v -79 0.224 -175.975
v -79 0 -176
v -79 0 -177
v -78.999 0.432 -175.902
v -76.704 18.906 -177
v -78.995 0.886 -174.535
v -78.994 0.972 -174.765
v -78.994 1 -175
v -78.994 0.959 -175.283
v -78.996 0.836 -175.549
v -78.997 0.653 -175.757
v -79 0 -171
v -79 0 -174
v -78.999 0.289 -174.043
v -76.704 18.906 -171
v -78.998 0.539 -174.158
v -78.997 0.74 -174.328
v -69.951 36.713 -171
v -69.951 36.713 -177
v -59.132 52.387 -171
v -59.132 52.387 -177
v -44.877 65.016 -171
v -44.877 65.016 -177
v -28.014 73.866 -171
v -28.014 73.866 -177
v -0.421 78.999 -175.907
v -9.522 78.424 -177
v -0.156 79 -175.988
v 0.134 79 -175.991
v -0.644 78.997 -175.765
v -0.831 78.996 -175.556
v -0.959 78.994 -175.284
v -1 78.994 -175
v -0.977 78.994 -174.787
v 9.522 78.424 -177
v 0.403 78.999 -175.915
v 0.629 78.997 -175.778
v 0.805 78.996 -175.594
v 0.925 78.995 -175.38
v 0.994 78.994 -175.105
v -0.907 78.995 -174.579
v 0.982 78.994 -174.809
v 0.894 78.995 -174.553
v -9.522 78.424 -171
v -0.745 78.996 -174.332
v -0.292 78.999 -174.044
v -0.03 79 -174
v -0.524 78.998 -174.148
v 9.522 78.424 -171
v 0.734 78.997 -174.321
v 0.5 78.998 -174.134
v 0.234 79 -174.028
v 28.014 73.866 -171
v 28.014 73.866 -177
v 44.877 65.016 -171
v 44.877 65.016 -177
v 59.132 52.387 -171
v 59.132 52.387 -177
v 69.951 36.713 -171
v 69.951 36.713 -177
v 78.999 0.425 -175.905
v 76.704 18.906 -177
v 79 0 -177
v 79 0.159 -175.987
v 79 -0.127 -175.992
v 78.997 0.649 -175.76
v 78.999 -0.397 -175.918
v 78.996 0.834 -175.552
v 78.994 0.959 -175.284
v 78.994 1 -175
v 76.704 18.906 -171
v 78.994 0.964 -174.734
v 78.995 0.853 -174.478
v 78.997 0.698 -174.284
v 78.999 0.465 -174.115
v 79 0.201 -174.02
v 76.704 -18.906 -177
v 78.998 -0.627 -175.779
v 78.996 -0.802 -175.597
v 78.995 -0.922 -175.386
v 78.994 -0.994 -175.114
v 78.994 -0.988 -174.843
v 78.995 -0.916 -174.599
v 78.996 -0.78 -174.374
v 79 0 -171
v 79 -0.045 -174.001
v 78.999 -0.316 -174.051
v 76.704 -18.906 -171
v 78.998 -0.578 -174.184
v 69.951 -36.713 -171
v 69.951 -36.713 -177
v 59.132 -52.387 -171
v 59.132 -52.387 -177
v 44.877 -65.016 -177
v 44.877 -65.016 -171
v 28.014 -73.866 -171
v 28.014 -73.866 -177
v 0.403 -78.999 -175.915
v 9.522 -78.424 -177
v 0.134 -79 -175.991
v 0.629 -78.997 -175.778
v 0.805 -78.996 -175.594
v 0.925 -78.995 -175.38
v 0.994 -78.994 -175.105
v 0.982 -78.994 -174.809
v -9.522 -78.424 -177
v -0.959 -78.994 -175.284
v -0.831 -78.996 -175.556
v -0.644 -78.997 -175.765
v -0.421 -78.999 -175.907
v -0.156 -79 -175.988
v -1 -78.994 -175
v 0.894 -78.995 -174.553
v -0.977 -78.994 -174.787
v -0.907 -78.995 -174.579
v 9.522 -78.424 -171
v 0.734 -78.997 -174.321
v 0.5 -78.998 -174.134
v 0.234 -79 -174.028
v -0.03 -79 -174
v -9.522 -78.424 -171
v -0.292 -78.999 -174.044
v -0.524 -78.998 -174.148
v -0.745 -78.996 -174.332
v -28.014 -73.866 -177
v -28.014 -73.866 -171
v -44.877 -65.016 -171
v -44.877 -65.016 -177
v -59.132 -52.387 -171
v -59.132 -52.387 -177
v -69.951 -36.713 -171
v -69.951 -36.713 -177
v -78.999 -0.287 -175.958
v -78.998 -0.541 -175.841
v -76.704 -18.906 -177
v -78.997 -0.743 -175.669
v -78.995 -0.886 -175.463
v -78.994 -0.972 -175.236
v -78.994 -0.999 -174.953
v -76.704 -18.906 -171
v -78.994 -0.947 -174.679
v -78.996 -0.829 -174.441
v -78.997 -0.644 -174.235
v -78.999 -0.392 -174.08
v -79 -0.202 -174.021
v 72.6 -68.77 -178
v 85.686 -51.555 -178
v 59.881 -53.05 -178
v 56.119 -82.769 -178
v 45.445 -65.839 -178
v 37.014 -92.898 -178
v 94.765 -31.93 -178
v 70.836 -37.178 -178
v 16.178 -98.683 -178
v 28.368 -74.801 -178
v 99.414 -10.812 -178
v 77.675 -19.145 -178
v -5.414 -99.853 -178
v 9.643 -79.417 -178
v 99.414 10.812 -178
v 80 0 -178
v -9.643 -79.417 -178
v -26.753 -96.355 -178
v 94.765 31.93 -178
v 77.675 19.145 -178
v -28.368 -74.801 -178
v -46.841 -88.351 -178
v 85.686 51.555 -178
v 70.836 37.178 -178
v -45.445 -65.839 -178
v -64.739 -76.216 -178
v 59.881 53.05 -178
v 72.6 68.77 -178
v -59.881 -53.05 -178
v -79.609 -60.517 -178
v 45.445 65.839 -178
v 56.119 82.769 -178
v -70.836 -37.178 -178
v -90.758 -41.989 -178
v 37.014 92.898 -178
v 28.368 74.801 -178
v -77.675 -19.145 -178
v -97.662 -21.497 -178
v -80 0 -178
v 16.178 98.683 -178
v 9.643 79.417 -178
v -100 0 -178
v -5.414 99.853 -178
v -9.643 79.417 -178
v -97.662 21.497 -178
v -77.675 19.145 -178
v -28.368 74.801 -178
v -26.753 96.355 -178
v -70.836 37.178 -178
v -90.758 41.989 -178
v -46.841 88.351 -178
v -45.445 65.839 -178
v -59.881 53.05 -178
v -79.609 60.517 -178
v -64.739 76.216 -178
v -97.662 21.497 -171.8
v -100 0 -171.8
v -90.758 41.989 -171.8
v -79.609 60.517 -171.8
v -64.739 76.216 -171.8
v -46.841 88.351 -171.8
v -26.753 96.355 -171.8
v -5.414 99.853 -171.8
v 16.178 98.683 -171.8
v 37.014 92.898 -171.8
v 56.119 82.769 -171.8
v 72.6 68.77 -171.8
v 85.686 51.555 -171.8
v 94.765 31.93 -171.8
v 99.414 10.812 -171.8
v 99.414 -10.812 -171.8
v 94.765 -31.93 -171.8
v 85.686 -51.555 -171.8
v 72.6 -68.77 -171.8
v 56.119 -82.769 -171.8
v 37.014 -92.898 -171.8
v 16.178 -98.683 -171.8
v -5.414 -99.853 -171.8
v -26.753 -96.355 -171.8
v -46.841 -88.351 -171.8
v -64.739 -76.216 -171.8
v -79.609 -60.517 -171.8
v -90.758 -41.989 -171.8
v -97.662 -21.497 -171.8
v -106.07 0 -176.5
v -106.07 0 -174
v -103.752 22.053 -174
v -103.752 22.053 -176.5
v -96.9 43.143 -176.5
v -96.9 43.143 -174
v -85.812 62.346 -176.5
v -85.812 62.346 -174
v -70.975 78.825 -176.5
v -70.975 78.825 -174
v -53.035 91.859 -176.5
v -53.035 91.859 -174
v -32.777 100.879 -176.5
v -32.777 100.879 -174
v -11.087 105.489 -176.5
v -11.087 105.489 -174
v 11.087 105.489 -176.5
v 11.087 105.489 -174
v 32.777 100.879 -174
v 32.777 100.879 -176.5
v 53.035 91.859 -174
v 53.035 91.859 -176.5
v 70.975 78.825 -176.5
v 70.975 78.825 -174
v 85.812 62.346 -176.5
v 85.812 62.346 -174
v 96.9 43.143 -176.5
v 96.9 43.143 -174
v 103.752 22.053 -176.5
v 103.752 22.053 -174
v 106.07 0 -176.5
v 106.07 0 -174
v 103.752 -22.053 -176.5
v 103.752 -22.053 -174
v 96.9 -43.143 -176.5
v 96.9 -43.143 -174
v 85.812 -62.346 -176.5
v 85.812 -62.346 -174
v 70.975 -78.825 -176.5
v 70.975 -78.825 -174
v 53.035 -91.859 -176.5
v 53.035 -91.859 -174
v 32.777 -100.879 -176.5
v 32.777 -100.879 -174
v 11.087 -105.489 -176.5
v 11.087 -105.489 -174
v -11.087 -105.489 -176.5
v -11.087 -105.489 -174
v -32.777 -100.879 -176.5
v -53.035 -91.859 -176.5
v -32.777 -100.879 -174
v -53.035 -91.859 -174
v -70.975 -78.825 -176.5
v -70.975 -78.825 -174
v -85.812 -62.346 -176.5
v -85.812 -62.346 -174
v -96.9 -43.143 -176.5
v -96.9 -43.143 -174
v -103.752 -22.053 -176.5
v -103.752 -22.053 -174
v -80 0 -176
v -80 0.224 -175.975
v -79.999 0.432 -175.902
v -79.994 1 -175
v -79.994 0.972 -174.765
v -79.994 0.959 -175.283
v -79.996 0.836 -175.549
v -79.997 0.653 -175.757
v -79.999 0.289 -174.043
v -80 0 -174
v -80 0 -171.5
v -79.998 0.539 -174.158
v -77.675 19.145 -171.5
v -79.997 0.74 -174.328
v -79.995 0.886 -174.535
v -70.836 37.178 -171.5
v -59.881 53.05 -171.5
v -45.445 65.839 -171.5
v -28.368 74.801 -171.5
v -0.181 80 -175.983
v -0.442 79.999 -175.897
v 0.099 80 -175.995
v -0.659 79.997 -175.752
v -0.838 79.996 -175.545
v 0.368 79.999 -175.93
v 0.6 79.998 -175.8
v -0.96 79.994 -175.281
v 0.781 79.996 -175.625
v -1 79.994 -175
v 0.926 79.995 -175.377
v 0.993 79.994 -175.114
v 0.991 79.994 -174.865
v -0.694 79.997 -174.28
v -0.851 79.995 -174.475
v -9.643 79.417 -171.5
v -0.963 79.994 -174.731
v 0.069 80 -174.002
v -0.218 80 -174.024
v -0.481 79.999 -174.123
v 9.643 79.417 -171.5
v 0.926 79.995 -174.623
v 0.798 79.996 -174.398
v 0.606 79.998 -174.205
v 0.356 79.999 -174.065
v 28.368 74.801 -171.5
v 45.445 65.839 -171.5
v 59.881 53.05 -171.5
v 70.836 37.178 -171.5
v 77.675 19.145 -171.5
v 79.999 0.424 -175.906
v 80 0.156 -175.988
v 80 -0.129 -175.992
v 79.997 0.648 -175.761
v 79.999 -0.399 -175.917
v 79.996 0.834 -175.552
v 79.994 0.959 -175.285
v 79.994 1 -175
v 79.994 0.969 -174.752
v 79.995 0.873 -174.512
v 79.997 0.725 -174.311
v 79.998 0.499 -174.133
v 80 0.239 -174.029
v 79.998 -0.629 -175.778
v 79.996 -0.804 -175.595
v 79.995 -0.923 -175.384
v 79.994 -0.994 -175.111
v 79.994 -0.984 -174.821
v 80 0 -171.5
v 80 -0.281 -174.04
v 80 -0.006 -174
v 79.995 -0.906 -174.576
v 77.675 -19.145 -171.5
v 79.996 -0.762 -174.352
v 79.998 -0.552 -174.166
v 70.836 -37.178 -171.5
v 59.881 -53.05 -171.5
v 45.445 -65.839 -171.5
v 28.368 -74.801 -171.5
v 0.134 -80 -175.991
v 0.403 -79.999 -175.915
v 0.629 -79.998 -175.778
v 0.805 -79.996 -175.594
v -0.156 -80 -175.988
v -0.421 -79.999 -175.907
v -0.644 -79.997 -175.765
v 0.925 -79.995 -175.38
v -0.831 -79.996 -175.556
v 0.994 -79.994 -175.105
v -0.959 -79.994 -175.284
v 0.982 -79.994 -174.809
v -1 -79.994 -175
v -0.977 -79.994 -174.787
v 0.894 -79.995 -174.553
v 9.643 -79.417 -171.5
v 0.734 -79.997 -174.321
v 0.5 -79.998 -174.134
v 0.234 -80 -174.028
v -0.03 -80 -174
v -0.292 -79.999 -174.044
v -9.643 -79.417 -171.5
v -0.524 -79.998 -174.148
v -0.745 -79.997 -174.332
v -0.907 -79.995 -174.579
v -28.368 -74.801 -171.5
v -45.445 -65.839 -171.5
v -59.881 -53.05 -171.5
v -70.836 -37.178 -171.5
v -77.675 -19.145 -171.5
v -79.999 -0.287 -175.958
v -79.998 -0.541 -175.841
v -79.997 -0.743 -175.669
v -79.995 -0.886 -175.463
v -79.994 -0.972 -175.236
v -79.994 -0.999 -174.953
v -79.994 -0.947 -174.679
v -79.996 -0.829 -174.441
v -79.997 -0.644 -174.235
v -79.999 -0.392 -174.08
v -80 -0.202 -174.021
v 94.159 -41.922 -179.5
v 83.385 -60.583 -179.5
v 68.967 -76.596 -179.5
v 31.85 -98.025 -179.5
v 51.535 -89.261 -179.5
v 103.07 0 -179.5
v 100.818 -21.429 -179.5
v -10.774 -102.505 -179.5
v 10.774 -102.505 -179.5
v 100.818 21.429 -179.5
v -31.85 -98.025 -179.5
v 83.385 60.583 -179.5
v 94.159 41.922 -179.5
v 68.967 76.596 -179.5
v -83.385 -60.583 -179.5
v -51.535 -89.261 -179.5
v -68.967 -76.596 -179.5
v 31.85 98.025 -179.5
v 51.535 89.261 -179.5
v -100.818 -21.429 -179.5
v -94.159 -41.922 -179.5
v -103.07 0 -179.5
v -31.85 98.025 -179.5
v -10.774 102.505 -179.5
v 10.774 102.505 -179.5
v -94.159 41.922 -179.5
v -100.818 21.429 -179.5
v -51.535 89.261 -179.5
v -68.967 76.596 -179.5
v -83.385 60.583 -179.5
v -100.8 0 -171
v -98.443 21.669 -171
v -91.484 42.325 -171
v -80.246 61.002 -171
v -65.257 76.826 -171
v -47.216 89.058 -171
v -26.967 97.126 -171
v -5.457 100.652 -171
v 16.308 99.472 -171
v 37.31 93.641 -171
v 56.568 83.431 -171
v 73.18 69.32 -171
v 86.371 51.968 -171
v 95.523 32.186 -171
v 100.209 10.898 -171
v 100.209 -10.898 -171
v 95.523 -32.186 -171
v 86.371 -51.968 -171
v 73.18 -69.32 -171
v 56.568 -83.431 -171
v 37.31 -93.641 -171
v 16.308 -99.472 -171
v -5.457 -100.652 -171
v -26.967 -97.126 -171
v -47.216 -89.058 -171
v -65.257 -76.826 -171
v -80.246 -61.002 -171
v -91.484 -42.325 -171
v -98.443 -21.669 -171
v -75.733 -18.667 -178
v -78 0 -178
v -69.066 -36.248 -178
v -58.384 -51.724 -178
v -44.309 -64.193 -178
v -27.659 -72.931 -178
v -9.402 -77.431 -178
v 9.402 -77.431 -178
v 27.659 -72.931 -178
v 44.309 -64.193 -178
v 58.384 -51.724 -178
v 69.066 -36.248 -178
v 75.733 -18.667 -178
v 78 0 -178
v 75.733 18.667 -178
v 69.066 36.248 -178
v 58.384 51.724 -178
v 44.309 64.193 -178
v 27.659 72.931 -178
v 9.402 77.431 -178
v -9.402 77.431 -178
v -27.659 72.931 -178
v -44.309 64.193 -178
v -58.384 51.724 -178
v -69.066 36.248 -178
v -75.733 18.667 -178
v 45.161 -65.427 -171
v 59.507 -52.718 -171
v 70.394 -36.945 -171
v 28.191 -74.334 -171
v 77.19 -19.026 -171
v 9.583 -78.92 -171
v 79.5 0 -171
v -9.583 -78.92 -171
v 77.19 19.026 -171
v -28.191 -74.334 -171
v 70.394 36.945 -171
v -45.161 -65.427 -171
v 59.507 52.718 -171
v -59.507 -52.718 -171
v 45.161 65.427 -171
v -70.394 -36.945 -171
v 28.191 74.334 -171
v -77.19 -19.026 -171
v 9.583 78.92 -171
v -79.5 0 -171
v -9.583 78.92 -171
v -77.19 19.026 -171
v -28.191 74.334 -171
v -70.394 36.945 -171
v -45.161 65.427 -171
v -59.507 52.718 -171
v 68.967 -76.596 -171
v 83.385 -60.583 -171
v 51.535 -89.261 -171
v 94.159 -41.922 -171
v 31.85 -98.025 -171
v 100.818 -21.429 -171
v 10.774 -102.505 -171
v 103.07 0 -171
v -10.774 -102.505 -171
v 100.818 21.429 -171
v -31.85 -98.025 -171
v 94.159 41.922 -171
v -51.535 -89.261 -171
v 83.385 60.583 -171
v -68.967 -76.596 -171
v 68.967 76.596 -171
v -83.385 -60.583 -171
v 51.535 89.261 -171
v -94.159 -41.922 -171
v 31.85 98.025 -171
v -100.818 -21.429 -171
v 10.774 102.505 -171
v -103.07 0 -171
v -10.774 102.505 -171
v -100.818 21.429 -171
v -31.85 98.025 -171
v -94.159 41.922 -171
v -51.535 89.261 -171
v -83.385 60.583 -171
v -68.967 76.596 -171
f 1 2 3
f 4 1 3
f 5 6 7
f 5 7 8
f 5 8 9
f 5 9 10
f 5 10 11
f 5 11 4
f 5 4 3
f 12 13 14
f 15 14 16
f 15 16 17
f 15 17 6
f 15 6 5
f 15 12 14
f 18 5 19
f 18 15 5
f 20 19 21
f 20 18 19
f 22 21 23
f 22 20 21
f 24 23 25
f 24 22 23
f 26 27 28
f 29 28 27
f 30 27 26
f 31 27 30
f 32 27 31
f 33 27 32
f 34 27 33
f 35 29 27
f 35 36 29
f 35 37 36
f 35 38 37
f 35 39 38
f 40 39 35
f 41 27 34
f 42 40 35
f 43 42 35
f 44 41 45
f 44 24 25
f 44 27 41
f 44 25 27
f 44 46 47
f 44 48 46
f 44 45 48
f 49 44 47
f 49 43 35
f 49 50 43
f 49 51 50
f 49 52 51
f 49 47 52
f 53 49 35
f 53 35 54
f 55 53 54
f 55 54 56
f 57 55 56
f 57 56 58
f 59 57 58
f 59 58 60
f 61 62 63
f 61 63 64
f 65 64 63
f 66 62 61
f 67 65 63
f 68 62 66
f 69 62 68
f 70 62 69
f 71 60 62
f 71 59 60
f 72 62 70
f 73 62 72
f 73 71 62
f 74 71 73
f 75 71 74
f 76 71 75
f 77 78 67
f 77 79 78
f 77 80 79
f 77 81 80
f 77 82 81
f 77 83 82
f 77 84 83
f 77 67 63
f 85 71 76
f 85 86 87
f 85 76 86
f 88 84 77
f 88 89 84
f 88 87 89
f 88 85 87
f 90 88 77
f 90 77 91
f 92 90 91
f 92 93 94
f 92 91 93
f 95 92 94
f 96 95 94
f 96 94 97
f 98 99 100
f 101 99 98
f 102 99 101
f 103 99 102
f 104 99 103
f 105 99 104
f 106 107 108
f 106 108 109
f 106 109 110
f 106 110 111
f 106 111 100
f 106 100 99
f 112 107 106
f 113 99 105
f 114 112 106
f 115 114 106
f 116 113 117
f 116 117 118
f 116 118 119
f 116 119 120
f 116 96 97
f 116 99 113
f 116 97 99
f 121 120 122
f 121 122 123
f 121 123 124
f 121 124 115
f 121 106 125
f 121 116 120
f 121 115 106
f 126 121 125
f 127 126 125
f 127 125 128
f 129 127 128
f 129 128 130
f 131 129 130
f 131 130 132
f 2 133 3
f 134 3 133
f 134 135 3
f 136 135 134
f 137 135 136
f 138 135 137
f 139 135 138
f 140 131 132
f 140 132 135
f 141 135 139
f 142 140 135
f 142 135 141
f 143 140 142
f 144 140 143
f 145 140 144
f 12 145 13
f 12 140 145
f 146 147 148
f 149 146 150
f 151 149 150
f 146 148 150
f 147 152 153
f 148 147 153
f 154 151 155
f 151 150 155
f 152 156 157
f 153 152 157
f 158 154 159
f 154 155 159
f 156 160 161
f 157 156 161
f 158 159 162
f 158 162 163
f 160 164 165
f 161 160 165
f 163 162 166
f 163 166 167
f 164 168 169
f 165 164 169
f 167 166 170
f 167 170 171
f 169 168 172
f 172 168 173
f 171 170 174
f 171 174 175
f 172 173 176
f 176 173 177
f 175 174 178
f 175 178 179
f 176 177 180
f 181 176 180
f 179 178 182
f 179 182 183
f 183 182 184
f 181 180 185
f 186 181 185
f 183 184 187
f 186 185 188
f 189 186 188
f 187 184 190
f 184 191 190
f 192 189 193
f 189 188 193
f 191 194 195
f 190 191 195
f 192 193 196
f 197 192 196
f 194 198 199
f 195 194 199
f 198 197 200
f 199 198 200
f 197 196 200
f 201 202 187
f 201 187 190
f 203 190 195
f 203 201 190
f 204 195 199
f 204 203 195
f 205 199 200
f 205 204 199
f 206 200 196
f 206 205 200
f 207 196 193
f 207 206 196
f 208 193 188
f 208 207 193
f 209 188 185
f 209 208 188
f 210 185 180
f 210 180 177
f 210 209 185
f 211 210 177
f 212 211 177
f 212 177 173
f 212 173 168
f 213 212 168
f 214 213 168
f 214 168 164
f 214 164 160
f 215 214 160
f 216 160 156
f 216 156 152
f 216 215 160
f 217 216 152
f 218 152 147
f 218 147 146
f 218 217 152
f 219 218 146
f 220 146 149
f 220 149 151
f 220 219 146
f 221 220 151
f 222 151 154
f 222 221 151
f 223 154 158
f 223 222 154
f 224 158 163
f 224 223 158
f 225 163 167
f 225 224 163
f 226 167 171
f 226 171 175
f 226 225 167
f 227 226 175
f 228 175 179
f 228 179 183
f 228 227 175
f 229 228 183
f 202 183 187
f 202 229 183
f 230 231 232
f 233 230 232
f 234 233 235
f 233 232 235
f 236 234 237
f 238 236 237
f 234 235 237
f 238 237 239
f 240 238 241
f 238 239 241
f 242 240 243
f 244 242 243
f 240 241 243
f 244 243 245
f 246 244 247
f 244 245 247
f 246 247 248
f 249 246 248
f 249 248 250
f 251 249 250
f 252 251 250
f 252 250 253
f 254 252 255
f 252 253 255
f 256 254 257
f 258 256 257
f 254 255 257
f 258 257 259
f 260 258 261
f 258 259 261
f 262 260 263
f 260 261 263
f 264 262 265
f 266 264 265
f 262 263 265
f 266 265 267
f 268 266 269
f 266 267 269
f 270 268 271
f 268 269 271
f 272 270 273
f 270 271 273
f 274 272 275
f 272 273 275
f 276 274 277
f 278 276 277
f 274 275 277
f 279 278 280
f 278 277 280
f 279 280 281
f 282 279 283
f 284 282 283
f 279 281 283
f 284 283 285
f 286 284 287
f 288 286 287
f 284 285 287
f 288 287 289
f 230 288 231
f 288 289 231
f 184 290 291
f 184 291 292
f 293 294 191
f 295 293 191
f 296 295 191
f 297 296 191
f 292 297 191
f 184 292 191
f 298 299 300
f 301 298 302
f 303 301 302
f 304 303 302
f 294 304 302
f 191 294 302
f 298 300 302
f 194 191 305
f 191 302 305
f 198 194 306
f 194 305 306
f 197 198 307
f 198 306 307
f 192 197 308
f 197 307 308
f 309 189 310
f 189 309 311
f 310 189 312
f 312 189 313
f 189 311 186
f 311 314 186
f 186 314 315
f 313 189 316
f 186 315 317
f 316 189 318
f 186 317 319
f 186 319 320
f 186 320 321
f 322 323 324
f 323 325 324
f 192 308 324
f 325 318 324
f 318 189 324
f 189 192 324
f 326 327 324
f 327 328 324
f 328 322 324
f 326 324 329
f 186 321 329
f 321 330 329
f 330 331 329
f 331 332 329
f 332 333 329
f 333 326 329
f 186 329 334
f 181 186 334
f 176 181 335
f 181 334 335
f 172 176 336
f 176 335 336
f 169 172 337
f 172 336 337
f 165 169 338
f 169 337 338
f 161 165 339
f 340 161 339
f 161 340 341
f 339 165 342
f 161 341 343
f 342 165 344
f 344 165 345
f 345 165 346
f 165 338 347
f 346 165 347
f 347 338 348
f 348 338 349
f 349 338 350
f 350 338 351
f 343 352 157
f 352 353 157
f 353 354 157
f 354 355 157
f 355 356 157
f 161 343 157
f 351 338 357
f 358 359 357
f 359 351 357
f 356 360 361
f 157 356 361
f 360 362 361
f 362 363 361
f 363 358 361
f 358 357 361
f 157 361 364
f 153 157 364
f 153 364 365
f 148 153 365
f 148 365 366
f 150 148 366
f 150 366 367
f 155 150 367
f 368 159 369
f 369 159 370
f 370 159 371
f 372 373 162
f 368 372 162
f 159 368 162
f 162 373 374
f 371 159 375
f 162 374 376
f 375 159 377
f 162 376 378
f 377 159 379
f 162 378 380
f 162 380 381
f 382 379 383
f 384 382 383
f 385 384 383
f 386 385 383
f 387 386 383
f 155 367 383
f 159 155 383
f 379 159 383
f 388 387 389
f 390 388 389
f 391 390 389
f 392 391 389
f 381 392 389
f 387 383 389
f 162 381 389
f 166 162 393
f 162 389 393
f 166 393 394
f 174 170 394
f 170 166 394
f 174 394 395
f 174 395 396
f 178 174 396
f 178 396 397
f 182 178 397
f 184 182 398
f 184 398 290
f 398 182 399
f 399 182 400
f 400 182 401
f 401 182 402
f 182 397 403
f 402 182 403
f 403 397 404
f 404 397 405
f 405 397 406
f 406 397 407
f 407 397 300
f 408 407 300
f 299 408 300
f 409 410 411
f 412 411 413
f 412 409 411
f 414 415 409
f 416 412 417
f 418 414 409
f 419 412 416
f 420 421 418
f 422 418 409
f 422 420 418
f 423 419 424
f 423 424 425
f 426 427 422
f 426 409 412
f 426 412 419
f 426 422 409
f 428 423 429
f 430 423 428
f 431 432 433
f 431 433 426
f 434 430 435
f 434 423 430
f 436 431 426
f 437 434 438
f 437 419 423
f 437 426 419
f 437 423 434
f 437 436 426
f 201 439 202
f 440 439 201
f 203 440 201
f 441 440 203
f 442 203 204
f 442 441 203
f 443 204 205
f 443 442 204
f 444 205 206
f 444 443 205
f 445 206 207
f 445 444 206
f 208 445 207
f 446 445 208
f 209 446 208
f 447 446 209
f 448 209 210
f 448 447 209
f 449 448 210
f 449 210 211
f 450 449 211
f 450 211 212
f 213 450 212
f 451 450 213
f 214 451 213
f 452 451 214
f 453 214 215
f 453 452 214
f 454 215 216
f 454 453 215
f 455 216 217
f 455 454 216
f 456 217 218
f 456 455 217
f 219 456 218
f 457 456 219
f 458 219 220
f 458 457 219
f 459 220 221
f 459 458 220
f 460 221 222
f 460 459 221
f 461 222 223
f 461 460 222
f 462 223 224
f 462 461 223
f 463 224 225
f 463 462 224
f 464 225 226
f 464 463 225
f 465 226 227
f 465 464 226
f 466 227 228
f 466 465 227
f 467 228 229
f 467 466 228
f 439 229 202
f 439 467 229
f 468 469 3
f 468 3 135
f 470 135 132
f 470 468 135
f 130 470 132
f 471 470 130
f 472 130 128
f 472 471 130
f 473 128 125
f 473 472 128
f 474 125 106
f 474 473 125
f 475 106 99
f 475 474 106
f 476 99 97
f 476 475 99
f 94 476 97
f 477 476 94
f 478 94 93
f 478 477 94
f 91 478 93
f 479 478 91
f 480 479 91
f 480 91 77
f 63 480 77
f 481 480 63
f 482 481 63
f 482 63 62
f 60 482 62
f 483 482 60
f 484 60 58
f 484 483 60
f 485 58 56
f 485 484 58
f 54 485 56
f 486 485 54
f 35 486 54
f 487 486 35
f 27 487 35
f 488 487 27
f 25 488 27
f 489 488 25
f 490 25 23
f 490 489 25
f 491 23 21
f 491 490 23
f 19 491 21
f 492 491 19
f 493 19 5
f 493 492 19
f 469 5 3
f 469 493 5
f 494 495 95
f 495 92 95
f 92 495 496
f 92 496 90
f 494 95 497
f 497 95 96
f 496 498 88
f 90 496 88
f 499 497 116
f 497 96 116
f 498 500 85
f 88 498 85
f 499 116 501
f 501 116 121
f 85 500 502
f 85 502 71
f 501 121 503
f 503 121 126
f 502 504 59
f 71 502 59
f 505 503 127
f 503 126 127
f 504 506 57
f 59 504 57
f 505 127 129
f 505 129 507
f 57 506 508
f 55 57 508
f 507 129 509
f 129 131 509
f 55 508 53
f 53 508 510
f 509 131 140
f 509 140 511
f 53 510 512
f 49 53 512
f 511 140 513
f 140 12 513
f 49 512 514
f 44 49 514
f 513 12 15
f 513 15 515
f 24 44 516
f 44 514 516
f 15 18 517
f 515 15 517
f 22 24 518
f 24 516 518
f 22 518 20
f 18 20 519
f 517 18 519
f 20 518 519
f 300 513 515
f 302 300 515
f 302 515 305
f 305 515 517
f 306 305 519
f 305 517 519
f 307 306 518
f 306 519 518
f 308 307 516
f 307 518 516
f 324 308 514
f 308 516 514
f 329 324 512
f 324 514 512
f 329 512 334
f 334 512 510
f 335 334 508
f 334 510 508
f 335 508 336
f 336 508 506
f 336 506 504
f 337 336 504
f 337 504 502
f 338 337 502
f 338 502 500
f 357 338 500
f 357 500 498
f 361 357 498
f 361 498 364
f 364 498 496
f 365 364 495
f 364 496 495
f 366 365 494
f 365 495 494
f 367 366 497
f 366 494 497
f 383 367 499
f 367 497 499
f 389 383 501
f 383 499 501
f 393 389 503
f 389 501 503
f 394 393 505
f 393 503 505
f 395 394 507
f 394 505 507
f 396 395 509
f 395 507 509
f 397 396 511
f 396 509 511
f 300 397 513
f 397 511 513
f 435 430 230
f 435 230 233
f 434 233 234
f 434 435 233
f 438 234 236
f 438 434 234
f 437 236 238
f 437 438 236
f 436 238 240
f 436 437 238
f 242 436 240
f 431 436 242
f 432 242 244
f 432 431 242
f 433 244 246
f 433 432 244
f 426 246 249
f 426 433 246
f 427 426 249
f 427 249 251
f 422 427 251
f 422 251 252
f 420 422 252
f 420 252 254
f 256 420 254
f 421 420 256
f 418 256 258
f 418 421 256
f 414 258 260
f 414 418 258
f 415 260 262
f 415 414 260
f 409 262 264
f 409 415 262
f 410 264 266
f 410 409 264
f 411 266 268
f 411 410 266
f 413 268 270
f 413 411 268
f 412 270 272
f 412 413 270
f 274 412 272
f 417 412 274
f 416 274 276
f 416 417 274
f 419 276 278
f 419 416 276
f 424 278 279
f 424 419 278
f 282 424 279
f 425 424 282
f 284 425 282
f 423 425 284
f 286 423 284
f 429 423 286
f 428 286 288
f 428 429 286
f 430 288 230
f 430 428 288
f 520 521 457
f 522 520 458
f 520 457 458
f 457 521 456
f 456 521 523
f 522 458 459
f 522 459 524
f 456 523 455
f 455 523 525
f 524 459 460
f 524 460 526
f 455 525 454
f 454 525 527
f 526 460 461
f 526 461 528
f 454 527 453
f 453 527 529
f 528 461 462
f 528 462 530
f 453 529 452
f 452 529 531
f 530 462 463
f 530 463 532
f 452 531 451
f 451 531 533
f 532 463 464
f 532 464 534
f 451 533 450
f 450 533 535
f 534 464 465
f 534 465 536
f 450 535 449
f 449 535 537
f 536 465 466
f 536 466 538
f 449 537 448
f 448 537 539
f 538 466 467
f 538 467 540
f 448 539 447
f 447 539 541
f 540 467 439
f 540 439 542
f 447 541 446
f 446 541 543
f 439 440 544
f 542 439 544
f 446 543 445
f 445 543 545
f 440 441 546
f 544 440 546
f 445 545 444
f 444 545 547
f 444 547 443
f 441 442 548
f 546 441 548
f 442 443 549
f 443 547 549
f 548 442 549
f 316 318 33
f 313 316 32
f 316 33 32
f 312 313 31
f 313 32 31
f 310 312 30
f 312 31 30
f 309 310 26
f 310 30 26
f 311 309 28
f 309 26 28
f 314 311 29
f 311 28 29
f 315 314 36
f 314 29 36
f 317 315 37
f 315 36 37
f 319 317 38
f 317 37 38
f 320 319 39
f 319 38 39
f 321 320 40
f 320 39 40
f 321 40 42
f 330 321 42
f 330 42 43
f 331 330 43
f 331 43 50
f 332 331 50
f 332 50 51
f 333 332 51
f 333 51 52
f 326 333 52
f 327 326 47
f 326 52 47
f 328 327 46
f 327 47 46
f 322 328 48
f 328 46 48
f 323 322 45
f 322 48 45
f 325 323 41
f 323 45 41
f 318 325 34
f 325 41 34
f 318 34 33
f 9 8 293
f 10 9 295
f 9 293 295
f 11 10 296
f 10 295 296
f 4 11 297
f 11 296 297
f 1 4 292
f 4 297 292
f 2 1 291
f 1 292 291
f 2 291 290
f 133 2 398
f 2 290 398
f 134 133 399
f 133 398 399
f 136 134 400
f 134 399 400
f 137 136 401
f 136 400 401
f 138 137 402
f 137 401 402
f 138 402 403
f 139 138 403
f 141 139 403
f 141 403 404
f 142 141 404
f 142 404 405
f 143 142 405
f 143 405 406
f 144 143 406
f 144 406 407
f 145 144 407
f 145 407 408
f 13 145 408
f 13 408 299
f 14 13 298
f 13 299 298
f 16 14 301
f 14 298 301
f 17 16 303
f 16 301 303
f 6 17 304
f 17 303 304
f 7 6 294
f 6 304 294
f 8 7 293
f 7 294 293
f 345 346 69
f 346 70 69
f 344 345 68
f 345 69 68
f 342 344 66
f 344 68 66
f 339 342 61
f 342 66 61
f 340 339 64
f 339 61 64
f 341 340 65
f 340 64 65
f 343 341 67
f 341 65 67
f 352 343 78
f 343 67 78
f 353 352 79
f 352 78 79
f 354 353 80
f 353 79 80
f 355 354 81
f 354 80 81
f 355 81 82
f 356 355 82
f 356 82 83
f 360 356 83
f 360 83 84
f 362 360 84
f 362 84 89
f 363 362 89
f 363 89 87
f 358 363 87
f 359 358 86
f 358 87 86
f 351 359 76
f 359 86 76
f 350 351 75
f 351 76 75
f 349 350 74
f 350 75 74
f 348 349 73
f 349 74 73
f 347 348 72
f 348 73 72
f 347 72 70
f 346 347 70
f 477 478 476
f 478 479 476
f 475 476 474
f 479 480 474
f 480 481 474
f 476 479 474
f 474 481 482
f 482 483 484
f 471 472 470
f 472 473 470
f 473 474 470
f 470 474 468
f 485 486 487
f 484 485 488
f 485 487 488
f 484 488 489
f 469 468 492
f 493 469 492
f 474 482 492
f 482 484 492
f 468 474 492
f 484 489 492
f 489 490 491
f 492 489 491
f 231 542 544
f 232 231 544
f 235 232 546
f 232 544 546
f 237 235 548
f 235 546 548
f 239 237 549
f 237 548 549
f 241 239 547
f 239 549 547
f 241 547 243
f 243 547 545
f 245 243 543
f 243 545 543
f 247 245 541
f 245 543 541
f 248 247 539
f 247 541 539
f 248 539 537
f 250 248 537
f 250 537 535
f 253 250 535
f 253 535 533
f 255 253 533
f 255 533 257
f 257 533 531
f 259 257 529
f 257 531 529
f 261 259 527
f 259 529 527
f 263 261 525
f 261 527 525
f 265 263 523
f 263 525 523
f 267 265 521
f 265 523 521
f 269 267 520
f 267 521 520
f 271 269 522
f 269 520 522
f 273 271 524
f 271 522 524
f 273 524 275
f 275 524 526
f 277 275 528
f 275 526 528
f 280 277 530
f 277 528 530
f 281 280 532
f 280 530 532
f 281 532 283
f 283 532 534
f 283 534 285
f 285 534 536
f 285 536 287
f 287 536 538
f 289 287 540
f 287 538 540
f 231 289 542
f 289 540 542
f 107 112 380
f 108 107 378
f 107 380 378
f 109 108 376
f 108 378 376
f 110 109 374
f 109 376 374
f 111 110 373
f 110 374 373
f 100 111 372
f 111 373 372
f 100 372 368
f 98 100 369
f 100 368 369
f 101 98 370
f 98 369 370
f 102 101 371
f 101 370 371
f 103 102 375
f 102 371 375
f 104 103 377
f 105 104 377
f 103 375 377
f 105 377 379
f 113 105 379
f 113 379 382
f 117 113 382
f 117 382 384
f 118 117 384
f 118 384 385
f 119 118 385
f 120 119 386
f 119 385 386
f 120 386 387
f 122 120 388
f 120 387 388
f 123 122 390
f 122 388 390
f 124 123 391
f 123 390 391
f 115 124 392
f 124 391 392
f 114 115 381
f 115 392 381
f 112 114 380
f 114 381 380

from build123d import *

# Parameters (mm, degrees)
SKETCH019_R             = 106.07
PAD010_DEPTH            = 8.5
SKETCH020_R             = 100
POCKET001_DEPTH         = 7
CHAMFER008_SIZE         = 3
CHAMFER015_SIZE         = 3
SKETCH028_R             = 80
SKETCH028_R_2           = 79
PAD012_DEPTH            = 8
SKETCH029_R             = 1
POCKET006_DEPTH         = 87.5
SKETCH030_R             = 1
POCKET007_DEPTH         = 87.5
CHAMFER016_SIZE         = 1
CHAMFER017_SIZE         = 0.8
CHAMFER018_SIZE         = 0.5
BODY008_PLACEMENT_ANGLE = 180


with BuildPart() as part:
    # Sketch019 → Pad010 (new body)
    with BuildSketch(Plane.XY):
        Circle(SKETCH019_R)
    extrude(amount=PAD010_DEPTH)

    # Sketch020 → Pocket001 (cut)
    with BuildSketch(Plane.XY):
        Circle(SKETCH020_R)
    extrude(amount=POCKET001_DEPTH, mode=Mode.SUBTRACT)

    # Chamfer008
    chamfer008_edges = [part.edges().sort_by_distance(p)[0] for p in [
        (-106.07, 0, 8.5),
    ]]
    chamfer(chamfer008_edges, length=CHAMFER008_SIZE)

    # Chamfer015
    chamfer015_edges = [part.edges().sort_by_distance(p)[0] for p in [
        (-106.07, 0, 0),
    ]]
    chamfer(chamfer015_edges, length=CHAMFER015_SIZE)

    # Sketch028 → Pad012 (join)
    with BuildSketch(Plane.XY):
        Circle(SKETCH028_R)
        Circle(SKETCH028_R_2, mode=Mode.SUBTRACT)
    extrude(amount=PAD012_DEPTH)

    # Sketch029 → Pocket006 (cut, symmetric)
    with BuildSketch(Plane.XZ):
        with Locations((0, 4)):
            Circle(SKETCH029_R)
    extrude(amount=POCKET006_DEPTH, both=True, mode=Mode.SUBTRACT)

    # Sketch030 → Pocket007 (cut, symmetric)
    with BuildSketch(Plane.YZ):
        with Locations((0, 4)):
            Circle(SKETCH030_R)
    extrude(amount=POCKET007_DEPTH, both=True, mode=Mode.SUBTRACT)

    # Chamfer016
    chamfer016_edges = [part.edges().sort_by_distance(p)[0] for p in [
        (-79, 0, 7),
    ]]
    chamfer(chamfer016_edges, length=CHAMFER016_SIZE)

    # Chamfer017
    chamfer017_edges = [part.edges().sort_by_distance(p)[0] for p in [
        (-100, 0, 0),
    ]]
    chamfer(chamfer017_edges, length=CHAMFER017_SIZE)

    # Chamfer018
    chamfer018_edges = [part.edges().sort_by_distance(p)[0] for p in [
        (-80, 0, 0),
    ]]
    chamfer(chamfer018_edges, length=CHAMFER018_SIZE)


with BuildPart() as part_1:
    # Body008 placement: moved
    add(part.part.moved(Location((0, 0, -171))).rotate(Axis((0, 0, -171), (0, 1, 0)), BODY008_PLACEMENT_ANGLE))


solid = part_1.part
